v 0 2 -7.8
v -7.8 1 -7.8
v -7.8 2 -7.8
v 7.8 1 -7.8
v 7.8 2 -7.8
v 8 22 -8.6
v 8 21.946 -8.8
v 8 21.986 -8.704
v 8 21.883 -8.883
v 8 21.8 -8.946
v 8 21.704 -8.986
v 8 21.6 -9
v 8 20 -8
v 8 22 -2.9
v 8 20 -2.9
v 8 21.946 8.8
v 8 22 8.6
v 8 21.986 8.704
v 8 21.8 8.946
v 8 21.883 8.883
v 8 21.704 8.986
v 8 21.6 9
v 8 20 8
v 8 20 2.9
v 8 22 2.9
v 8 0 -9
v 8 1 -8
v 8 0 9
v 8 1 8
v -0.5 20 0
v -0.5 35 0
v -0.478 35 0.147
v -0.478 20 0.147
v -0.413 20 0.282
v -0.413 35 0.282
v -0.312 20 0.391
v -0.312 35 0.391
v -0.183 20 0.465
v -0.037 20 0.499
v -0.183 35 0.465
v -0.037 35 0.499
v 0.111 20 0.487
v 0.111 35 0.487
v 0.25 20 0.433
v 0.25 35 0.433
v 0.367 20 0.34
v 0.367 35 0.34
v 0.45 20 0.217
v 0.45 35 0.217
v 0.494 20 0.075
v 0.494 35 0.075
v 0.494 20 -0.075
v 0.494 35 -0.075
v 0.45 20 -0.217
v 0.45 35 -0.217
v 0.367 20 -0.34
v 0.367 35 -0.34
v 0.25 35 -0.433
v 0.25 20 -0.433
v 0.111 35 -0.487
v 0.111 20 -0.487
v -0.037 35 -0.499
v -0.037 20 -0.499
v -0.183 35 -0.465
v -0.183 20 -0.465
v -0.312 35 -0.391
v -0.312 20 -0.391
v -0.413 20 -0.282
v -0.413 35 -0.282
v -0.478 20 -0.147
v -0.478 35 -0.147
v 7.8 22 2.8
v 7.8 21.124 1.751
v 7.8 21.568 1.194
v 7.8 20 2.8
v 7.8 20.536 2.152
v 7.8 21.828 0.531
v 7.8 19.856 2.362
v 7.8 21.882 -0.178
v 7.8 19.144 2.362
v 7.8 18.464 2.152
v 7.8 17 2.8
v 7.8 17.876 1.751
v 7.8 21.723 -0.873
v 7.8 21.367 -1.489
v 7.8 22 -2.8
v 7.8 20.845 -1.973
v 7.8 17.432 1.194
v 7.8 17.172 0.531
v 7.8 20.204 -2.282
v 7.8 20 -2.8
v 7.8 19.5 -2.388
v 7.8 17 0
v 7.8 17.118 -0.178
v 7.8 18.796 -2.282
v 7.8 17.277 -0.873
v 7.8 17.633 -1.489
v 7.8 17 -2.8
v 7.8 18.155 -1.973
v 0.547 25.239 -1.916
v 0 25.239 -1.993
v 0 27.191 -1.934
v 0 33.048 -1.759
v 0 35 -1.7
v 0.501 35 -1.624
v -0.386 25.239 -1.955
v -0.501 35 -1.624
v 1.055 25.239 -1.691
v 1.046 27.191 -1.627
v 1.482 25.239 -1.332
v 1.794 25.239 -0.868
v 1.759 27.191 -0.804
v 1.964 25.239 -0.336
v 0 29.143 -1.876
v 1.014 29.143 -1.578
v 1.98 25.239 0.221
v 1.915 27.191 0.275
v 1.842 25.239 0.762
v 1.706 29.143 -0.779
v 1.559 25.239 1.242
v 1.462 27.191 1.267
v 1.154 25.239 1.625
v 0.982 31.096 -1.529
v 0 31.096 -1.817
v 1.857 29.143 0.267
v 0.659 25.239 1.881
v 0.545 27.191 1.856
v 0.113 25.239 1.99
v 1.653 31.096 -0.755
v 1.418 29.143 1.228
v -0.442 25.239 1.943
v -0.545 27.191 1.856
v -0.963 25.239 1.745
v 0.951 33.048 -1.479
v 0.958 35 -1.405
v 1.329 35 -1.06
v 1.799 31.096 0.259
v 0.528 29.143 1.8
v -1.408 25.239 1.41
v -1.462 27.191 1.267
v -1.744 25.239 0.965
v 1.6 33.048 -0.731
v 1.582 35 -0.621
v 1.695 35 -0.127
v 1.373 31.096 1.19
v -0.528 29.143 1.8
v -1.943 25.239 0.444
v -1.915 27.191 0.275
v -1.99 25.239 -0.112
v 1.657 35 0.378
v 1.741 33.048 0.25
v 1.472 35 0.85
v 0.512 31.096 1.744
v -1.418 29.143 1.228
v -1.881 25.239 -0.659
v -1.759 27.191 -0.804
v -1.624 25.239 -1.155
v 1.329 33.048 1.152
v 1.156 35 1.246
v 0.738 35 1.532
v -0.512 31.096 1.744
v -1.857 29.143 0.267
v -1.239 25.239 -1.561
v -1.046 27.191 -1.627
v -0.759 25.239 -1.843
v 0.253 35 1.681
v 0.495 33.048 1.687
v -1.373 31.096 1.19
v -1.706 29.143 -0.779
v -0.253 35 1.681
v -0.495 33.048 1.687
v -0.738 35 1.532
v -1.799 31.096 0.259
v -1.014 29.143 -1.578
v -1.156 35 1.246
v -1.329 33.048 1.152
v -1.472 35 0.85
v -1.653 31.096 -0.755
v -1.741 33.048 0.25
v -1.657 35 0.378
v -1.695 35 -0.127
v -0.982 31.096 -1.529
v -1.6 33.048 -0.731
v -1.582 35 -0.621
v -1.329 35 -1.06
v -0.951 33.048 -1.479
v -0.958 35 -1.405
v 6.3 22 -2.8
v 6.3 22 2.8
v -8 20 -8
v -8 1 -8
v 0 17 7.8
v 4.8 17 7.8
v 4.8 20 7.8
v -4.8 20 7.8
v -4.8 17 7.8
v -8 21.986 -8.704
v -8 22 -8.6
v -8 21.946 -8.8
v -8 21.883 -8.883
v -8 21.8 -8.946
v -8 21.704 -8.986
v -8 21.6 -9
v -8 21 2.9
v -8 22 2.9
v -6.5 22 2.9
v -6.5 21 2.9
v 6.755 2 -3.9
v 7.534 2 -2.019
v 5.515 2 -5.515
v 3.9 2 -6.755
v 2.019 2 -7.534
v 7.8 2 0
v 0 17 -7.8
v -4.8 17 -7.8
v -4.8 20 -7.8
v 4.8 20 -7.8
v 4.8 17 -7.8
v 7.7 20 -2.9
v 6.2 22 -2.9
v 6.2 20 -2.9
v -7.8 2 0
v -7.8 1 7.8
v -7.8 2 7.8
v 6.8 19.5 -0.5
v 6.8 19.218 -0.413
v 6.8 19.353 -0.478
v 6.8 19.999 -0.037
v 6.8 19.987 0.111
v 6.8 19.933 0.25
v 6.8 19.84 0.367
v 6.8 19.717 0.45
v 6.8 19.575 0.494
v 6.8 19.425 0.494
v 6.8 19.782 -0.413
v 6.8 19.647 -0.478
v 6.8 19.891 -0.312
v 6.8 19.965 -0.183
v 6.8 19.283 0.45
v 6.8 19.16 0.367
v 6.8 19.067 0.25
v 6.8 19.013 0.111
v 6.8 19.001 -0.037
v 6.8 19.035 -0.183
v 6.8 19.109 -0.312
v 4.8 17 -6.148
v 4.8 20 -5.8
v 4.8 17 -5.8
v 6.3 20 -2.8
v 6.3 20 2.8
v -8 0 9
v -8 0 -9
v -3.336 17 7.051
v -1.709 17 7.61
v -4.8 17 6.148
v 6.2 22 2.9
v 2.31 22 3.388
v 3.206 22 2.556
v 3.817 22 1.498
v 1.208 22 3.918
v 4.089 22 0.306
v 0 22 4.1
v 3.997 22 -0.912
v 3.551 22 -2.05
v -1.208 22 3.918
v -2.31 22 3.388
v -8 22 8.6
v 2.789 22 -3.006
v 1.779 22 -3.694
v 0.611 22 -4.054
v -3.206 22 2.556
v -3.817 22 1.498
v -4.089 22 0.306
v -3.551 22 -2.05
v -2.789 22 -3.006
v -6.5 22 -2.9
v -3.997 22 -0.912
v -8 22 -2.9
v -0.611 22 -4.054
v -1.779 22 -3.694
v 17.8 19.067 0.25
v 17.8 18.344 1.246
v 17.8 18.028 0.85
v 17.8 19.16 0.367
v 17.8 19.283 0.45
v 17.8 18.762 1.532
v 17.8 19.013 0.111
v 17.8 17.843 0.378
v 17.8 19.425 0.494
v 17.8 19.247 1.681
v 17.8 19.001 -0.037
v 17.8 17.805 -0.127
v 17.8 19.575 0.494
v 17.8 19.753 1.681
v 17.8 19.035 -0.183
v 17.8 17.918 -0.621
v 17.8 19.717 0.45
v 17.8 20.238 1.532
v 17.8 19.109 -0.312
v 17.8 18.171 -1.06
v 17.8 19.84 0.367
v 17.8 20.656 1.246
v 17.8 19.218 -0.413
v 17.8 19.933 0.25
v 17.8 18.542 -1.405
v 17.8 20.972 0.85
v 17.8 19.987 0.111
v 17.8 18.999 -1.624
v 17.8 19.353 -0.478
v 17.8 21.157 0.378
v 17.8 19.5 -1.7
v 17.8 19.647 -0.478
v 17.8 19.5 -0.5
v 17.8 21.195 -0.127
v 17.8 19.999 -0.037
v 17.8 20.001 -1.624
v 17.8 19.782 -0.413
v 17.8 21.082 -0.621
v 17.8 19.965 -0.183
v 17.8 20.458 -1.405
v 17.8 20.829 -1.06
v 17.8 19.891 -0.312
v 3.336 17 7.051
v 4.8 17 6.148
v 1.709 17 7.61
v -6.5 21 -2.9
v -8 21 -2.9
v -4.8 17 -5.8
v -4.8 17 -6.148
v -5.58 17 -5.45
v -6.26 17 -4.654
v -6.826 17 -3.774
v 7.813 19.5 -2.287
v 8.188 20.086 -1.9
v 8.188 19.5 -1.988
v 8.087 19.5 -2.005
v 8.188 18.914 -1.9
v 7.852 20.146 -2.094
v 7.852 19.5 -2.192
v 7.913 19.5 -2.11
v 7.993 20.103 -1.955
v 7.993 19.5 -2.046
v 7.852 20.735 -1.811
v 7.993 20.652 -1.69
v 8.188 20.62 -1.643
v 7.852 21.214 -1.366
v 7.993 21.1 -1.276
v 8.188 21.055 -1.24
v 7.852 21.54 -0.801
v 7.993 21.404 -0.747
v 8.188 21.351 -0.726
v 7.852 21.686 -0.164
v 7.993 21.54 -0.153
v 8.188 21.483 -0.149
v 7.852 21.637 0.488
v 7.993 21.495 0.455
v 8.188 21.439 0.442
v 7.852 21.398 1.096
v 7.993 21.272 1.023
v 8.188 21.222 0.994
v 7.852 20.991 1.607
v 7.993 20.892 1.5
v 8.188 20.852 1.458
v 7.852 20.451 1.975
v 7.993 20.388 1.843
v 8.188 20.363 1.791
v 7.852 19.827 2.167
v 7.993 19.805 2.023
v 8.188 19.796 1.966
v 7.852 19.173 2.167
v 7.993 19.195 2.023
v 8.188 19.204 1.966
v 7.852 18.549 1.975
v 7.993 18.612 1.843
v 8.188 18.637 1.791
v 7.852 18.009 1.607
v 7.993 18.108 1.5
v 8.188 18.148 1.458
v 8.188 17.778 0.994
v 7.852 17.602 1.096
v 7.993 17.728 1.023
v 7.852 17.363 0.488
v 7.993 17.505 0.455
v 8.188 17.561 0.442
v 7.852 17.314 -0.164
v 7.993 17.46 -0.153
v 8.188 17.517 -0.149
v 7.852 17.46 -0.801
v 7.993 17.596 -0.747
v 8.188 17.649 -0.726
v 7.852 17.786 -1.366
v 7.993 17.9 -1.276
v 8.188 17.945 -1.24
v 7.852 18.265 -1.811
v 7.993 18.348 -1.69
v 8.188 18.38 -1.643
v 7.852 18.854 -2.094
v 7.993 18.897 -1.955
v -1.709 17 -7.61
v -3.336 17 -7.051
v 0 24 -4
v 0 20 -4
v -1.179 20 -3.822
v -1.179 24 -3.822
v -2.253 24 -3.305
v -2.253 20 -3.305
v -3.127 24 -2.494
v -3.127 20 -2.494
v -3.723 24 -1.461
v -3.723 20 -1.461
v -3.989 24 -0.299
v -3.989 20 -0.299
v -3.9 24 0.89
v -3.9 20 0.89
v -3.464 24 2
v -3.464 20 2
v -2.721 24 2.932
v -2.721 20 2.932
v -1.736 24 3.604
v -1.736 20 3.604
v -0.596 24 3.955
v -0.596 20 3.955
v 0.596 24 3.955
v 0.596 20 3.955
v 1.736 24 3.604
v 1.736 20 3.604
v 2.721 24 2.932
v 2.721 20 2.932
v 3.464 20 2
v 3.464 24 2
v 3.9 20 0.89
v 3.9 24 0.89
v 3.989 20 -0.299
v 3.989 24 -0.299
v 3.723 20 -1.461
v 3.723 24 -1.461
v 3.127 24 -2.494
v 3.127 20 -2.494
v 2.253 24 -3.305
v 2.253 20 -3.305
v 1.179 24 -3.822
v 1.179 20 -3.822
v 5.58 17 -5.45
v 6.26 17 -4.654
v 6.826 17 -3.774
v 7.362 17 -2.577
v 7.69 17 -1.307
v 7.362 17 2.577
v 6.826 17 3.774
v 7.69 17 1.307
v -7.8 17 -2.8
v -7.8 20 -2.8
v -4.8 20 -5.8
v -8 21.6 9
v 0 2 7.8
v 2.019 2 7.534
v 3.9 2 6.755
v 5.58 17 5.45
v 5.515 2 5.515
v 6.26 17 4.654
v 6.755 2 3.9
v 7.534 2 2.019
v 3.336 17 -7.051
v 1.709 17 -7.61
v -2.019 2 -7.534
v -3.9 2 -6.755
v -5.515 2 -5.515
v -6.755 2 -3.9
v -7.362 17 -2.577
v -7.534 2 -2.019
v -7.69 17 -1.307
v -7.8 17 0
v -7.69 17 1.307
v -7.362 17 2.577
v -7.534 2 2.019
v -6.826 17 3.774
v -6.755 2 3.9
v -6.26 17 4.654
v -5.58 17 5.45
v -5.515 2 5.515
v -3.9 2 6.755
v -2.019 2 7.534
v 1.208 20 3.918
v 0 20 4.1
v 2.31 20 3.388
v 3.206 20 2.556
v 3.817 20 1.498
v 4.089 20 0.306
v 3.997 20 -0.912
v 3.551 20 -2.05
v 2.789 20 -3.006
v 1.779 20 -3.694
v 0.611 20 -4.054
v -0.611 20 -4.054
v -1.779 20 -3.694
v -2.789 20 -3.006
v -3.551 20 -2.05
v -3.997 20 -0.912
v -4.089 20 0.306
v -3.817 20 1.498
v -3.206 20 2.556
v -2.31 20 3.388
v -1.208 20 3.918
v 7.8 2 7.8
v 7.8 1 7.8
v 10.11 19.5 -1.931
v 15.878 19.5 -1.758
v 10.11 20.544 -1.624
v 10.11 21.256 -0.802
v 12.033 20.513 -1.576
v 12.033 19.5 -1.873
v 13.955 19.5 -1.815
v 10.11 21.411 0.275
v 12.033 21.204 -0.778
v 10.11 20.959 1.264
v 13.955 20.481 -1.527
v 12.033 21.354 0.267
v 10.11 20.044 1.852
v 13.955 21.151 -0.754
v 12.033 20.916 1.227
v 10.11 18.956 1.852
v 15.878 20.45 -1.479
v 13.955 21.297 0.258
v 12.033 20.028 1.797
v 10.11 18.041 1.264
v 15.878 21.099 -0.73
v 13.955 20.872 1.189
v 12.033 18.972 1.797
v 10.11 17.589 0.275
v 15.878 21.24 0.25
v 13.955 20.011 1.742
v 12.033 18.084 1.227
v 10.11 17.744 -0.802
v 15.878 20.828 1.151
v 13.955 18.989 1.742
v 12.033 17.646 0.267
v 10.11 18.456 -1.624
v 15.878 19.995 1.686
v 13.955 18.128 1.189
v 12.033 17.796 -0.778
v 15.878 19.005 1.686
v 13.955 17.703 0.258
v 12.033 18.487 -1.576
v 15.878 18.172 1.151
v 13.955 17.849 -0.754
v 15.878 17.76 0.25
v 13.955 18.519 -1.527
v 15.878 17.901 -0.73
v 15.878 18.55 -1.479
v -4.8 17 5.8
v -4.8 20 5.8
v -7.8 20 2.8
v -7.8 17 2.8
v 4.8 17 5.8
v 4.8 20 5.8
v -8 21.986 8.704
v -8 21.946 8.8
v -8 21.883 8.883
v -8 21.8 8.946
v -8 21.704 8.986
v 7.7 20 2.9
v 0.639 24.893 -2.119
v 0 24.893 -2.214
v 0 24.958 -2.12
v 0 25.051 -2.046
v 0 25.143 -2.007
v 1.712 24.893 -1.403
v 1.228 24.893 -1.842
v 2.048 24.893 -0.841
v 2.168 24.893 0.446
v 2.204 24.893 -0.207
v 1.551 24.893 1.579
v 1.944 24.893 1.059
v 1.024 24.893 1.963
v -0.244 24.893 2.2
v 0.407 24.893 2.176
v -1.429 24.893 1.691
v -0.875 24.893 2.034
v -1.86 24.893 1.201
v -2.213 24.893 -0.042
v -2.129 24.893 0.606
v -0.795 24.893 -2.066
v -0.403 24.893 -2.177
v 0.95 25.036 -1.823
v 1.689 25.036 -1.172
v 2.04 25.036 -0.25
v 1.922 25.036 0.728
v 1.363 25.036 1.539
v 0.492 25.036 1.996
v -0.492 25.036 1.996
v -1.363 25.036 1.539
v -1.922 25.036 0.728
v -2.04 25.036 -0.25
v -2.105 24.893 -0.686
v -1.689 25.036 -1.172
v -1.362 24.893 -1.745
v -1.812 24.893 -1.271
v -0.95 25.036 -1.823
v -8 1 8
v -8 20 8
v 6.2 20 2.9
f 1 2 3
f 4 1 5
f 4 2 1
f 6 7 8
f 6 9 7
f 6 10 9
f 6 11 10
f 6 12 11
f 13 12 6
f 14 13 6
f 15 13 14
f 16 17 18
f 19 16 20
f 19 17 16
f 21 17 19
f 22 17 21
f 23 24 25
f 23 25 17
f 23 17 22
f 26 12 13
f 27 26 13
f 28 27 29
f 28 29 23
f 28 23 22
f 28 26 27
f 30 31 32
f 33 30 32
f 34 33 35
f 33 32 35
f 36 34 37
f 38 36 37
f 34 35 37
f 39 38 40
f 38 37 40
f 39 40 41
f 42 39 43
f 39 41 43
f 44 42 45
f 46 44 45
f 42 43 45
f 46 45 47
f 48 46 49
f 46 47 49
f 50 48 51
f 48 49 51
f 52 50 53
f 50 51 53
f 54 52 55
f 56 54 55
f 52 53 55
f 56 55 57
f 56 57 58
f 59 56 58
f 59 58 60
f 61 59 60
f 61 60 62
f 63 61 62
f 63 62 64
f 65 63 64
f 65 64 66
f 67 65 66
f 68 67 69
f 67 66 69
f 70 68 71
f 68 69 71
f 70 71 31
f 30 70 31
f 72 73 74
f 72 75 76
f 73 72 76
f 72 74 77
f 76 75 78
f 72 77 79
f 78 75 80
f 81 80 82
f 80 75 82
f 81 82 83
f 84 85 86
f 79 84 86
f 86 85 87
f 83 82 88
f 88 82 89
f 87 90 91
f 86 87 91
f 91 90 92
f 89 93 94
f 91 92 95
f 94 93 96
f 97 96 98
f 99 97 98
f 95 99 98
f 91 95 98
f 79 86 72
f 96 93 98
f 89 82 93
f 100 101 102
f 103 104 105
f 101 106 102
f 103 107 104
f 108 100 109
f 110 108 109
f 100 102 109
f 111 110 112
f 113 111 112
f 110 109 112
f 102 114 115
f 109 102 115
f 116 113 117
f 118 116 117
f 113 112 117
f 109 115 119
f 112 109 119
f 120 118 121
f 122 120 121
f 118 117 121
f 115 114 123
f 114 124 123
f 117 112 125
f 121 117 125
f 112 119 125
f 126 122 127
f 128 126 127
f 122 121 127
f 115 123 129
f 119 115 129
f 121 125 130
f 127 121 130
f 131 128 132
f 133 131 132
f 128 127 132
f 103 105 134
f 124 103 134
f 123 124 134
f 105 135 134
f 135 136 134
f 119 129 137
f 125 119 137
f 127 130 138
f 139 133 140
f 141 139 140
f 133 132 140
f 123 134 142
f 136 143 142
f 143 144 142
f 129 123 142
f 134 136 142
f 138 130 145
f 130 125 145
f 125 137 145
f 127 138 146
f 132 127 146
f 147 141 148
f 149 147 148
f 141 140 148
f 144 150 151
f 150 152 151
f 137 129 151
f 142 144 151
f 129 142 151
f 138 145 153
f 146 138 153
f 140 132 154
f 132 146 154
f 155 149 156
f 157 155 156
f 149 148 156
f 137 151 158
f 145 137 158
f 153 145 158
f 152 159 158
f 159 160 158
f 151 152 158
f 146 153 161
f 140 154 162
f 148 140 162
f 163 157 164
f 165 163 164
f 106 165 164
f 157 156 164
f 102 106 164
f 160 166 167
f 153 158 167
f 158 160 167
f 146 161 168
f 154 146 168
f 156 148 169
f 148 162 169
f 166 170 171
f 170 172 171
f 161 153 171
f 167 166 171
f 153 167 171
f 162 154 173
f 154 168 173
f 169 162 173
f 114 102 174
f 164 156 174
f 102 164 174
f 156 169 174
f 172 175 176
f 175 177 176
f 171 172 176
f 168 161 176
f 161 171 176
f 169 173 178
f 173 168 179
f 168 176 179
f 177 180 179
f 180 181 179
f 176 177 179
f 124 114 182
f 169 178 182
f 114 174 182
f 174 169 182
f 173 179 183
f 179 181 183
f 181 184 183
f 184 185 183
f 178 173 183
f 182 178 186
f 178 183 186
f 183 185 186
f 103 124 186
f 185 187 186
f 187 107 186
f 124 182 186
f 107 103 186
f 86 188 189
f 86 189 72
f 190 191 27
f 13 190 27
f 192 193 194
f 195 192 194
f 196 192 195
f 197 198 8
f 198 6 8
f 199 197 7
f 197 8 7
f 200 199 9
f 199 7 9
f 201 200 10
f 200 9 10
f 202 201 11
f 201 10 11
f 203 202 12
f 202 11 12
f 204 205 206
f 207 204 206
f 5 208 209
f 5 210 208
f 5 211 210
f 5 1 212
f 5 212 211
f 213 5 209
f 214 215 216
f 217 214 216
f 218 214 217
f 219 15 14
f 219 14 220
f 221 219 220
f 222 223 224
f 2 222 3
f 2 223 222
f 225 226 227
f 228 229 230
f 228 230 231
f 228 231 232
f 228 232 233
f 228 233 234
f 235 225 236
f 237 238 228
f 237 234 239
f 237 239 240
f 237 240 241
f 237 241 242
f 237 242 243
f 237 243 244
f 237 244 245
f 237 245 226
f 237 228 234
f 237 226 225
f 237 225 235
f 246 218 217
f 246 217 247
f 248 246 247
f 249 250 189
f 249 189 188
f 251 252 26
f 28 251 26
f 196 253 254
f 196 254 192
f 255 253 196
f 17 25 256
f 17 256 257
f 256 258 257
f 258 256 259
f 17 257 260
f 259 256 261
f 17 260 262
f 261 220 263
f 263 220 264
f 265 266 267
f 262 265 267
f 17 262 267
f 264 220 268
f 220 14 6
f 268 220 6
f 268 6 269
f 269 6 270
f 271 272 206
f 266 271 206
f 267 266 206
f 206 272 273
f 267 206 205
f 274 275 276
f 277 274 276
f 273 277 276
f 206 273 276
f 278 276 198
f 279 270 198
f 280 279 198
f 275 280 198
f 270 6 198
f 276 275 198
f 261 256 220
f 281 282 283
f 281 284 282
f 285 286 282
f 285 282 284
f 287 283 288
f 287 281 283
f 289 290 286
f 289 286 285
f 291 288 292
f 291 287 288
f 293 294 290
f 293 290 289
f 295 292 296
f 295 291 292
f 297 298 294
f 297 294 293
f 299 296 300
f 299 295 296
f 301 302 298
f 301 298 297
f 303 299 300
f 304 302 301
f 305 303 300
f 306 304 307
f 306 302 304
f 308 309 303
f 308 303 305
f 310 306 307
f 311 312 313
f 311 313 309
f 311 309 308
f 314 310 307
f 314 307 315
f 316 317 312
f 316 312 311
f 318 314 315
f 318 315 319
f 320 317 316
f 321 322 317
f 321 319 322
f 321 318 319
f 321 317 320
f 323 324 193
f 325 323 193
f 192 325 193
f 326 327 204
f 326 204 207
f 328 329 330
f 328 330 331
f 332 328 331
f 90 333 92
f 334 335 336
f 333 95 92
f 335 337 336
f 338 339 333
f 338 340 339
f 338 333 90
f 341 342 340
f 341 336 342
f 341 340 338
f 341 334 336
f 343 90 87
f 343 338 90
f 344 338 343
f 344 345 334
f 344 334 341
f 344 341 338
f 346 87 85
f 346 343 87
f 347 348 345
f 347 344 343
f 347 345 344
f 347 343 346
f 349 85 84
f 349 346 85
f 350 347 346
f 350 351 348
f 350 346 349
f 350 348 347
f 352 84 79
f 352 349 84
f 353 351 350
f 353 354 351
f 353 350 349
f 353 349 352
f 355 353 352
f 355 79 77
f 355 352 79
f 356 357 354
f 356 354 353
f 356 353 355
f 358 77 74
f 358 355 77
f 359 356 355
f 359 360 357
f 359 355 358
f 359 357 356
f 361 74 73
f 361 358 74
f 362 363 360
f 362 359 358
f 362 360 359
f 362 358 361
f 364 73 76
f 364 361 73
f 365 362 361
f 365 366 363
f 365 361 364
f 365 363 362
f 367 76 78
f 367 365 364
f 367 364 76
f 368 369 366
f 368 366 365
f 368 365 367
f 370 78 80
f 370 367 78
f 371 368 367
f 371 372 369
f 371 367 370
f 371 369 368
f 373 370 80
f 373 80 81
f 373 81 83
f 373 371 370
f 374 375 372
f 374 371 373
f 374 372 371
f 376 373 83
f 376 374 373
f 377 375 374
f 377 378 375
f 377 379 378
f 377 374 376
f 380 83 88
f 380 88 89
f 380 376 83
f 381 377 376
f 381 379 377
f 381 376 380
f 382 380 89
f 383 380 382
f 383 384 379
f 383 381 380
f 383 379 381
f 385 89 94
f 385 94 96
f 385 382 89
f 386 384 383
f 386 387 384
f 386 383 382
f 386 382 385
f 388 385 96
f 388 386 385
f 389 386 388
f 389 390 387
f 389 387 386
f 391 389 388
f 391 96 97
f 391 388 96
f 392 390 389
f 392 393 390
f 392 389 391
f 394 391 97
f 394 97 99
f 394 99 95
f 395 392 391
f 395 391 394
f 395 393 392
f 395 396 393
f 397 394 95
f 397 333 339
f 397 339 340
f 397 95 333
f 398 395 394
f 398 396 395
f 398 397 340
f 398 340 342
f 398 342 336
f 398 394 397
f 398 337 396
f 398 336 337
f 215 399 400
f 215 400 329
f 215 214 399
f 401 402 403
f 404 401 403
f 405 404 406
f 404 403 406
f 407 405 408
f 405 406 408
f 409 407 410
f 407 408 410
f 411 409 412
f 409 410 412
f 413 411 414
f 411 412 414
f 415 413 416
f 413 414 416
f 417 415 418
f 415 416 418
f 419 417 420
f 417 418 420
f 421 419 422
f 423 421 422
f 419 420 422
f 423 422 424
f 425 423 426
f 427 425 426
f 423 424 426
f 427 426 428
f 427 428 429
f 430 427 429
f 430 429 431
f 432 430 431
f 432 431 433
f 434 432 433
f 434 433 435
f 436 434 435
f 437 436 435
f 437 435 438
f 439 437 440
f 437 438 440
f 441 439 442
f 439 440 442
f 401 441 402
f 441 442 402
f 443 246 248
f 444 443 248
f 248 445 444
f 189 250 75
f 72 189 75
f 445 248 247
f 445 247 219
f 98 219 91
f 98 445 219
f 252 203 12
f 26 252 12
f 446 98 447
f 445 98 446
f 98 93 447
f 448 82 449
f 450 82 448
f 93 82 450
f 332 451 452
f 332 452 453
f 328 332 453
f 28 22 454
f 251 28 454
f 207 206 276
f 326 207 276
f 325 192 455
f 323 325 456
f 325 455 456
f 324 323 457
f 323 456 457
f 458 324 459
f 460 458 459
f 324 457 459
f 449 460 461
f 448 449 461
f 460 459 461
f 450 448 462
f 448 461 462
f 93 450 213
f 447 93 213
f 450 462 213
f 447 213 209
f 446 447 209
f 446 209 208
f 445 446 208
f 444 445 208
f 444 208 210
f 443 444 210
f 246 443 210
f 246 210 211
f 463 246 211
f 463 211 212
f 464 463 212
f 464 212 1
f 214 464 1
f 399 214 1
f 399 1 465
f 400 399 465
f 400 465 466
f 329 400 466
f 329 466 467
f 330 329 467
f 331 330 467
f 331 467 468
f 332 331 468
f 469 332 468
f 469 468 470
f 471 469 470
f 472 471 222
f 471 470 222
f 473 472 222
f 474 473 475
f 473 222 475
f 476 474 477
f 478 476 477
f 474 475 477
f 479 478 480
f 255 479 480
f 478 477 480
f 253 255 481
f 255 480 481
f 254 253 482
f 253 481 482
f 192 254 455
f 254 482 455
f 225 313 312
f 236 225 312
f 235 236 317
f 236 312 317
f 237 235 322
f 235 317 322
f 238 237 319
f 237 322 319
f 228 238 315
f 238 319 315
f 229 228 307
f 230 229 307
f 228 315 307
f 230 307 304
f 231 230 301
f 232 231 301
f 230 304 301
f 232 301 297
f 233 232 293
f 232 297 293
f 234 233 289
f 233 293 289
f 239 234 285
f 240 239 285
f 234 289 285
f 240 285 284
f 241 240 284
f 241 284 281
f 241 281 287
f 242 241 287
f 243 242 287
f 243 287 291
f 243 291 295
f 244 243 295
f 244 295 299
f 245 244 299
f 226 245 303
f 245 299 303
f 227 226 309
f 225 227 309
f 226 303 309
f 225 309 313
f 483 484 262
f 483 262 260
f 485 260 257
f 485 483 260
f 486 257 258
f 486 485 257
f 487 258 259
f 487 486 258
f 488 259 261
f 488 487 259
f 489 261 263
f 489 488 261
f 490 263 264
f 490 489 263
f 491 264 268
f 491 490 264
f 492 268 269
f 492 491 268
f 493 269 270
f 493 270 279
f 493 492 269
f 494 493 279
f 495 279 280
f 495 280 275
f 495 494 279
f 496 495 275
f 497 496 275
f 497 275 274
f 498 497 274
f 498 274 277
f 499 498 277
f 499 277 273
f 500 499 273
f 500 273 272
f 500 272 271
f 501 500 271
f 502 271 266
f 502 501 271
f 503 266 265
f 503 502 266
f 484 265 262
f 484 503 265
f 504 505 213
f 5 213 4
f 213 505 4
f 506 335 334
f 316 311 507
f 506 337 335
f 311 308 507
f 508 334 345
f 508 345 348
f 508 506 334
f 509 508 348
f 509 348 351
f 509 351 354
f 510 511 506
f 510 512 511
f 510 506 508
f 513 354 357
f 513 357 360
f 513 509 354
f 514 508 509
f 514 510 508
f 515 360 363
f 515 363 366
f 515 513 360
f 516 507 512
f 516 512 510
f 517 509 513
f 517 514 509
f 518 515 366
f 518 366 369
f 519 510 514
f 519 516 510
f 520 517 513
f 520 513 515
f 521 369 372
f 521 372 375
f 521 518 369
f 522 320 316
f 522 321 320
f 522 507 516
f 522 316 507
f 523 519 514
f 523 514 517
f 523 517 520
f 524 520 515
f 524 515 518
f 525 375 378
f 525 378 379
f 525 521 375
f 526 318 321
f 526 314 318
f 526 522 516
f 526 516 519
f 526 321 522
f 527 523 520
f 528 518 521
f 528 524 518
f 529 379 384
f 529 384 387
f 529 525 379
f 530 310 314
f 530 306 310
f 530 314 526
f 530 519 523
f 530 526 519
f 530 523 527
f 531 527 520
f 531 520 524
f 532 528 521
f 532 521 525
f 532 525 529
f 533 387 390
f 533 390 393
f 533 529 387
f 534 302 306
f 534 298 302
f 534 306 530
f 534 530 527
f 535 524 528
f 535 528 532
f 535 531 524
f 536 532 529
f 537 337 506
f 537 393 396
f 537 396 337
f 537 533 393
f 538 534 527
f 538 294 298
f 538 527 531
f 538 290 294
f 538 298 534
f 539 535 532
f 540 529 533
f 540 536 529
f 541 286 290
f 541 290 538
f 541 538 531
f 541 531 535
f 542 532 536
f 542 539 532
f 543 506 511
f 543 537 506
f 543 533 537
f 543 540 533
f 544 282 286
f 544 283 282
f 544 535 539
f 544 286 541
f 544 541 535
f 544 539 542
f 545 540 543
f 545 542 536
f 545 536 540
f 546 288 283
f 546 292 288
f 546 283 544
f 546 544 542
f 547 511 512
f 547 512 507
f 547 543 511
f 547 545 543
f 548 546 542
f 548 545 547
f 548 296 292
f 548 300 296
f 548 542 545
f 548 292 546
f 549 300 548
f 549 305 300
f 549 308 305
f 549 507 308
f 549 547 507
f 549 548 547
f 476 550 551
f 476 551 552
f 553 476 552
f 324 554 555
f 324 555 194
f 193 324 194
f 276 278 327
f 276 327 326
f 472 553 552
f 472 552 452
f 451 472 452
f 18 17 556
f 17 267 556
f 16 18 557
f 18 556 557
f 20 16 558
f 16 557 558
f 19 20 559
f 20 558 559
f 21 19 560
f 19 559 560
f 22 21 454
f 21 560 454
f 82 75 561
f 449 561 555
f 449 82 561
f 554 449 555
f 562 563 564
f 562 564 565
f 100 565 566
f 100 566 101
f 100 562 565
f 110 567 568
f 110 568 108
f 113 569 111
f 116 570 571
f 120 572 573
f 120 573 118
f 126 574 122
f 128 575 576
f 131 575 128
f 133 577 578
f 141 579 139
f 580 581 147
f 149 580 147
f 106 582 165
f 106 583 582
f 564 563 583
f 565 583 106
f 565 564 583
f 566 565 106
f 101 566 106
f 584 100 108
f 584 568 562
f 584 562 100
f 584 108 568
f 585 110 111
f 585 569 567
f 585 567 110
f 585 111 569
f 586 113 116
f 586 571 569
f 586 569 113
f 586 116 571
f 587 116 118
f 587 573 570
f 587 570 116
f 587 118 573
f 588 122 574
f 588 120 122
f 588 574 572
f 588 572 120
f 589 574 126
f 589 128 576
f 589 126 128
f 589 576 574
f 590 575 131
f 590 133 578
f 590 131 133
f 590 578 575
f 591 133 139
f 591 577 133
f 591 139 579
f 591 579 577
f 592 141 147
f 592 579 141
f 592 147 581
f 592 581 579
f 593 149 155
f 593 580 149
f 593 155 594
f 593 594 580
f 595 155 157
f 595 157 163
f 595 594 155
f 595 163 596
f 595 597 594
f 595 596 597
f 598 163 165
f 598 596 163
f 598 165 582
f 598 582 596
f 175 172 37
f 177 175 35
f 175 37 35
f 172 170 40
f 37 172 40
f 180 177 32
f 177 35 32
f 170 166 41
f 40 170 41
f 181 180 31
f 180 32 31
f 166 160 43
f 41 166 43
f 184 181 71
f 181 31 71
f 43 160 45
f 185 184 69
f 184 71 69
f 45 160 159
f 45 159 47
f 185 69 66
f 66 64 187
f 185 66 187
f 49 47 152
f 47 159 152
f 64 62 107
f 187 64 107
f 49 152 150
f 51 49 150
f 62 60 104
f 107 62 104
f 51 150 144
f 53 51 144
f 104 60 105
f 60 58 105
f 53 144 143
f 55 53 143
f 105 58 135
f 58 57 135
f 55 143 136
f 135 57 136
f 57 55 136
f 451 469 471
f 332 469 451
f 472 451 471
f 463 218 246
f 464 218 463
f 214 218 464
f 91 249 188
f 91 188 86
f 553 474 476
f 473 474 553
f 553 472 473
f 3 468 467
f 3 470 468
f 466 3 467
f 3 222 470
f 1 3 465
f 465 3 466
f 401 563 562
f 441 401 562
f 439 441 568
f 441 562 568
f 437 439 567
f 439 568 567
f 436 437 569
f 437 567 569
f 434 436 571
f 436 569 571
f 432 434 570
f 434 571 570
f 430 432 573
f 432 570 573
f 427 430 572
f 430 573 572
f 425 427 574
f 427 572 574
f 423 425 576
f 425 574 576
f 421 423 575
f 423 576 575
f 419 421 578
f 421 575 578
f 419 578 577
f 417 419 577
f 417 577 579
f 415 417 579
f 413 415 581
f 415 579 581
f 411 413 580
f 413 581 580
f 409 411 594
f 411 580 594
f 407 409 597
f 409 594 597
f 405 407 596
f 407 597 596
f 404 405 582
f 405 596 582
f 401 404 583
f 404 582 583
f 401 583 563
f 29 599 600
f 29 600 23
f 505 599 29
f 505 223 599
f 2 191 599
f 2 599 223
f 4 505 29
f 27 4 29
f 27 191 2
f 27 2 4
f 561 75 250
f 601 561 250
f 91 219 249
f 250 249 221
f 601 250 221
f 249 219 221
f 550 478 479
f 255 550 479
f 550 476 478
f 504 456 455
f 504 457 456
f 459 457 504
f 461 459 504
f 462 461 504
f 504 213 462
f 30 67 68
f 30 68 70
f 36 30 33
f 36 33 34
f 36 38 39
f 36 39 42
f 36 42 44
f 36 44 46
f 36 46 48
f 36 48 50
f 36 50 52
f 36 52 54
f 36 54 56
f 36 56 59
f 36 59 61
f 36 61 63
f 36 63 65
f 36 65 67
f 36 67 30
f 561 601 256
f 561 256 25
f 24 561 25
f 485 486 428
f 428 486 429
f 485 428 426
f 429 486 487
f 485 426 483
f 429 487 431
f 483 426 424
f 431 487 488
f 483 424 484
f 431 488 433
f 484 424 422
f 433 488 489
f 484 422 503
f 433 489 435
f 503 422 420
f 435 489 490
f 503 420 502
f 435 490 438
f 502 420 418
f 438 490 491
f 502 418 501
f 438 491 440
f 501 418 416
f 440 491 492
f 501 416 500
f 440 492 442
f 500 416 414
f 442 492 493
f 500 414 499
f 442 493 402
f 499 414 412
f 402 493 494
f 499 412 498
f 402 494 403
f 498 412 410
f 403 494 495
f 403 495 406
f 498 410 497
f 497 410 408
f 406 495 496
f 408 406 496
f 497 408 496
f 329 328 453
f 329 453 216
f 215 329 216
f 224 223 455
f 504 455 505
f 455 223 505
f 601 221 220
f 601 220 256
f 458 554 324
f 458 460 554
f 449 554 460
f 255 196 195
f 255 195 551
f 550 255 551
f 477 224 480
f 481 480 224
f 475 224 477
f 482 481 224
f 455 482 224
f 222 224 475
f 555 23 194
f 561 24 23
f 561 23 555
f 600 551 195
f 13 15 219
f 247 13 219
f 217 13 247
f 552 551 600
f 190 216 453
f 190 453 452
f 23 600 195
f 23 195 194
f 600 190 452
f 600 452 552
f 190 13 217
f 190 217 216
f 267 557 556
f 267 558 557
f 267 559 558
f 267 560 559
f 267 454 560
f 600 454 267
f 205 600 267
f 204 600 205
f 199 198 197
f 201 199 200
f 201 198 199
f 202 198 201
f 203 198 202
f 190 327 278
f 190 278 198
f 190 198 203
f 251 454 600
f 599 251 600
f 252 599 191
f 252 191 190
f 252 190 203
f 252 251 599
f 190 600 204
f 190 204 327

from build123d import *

# Parameters (mm, degrees)
SKETCH_1_W          = 16
SKETCH_1_H          = 18
EXTRUDE_1_DEPTH     = 1
SKETCH_2_W          = 15.6
SKETCH_2_H          = 15.6
EXTRUDE_2_DEPTH     = 1
SKETCH_3_R          = 7.8
EXTRUDE_3_DEPTH     = 15
EXTRUDE_4_DEPTH     = 3
SKETCH_5_R          = 4
EXTRUDE_5_DEPTH     = 4
SKETCH_7_R          = 0.5
CUT_EXTRUDE_1_DEPTH = 15
SKETCH_8_W          = 1.5
SKETCH_8_H          = 5.6
EXTRUDE_6_DEPTH     = 2
SKETCH_9_R          = 2
SKETCH_10_R         = 1.7
SKETCH_11_R         = 0.5
CUT_EXTRUDE_2_DEPTH = 11
SKETCH_12_W         = 16
SKETCH_12_H         = 1
EXTRUDE_7_DEPTH     = 19
SKETCH_13_R         = 4.1
EXTRUDE_8_DEPTH     = 2
SKETCH_14_W         = 1.5
SKETCH_14_H         = 5.8
CUT_EXTRUDE_3_DEPTH = 1
FILLET_1_R          = 0.4
FILLET_2_R          = 0.4


with BuildPart() as part:
    # 草图1 → 凸台-拉伸1 (new body)
    with BuildSketch(Plane(origin=(0, 0, 0), x_dir=(1, 0, 0), z_dir=(0, 1, 0))):
        Rectangle(SKETCH_1_W, SKETCH_1_H)
    extrude(amount=EXTRUDE_1_DEPTH)

    # 草图2 → 凸台-拉伸2 (add)
    with BuildSketch(Plane(origin=(0, 1, 0), x_dir=(1, 0, 0), z_dir=(0, 1, 0))):
        Rectangle(SKETCH_2_W, SKETCH_2_H)
    extrude(amount=EXTRUDE_2_DEPTH)

    # 草图3 → 凸台-拉伸3 (add)
    with BuildSketch(Plane(origin=(0, 2, 0), x_dir=(1, 0, 0), z_dir=(0, 1, 0))):
        with Locations(Location((0, 0, 0), (0, 0, 270))):
            Circle(SKETCH_3_R)
    extrude(amount=EXTRUDE_3_DEPTH)

    # 草图4 → 凸台-拉伸4 (add)
    with BuildSketch(Plane(origin=(0, 17, 0), x_dir=(1, 0, 0), z_dir=(0, 1, 0))):
        Polygon((-4.8, 7.8), (4.8, 7.8), (4.8, 5.8), (7.8, 2.8), (7.8, -2.8), (4.8, -5.8), (4.8, -7.8), (-4.8, -7.8), (-4.8, -5.8), (-7.8, -2.8), (-7.8, 2.8), (-4.8, 5.8), align=None)
    extrude(amount=EXTRUDE_4_DEPTH)

    # 草图5 → 凸台-拉伸5 (add)
    with BuildSketch(Plane(origin=(0, 20, 0), x_dir=(1, 0, 0), z_dir=(0, 1, 0))):
        with Locations(Location((0, 0, 0), (0, 0, 90))):
            Circle(SKETCH_5_R)
    extrude(amount=EXTRUDE_5_DEPTH)

    # 草图6 → 旋转1 (revolve)
    with BuildSketch(Plane.XY, mode=Mode.PRIVATE) as revolve_1_sk:
        Polygon((0, 24), (4, 24), (2, 25), (1.7, 35), (0, 35), align=None)
    revolve(revolve_1_sk.sketch.rotate(Axis((0, 35, 0), (0, -1, 0)), 270), axis=Axis((0, 35, 0), (0, -1, 0)))

    # 草图7 → 切除-拉伸1 (cut)
    with BuildSketch(Plane(origin=(0, 35, 0), x_dir=(1, 0, 0), z_dir=(0, 1, 0))):
        with Locations(Location((0, 0, 0), (0, 0, 180))):
            Circle(SKETCH_7_R)
    extrude(amount=-CUT_EXTRUDE_1_DEPTH, mode=Mode.SUBTRACT)

    # 草图8 → 凸台-拉伸6 (add)
    with BuildSketch(Plane(origin=(0, 20, 0), x_dir=(1, 0, 0), z_dir=(0, 1, 0))):
        with Locations((7.05, 0)):
            Rectangle(SKETCH_8_W, SKETCH_8_H)
    extrude(amount=EXTRUDE_6_DEPTH)

    # 草图9 → 放样1 section 0
    with BuildSketch(Plane(origin=(7.8, 0, 0), x_dir=(0, 0, -1), z_dir=(1, 0, 0))):
        with Locations((0, 19.5)):
            Circle(SKETCH_9_R)
    # 草图10 → 放样1 section 1
    with BuildSketch(Plane(origin=(17.8, 0, 0), x_dir=(0, 0, -1), z_dir=(1, 0, 0))):
        with Locations((0, 19.5)):
            Circle(SKETCH_10_R)
    loft()

    # 草图11 → 切除-拉伸2 (cut)
    with BuildSketch(Plane(origin=(17.8, 0, 0), x_dir=(0, 0, -1), z_dir=(1, 0, 0))):
        with Locations((0, 19.5)):
            Circle(SKETCH_11_R)
    extrude(amount=-CUT_EXTRUDE_2_DEPTH, mode=Mode.SUBTRACT)

    # 草图12 → 凸台-拉伸7 (add)
    with BuildSketch(Plane(origin=(0, 1, 0), x_dir=(1, 0, 0), z_dir=(0, 1, 0))):
        with Locations((0, 8.5)):
            Rectangle(SKETCH_12_W, SKETCH_12_H)
        with Locations((0, -8.5)):
            Rectangle(SKETCH_12_W, SKETCH_12_H)
    extrude(amount=EXTRUDE_7_DEPTH)

    # 草图13 → 凸台-拉伸8 (add)
    with BuildSketch(Plane(origin=(0, 20, 0), x_dir=(1, 0, 0), z_dir=(0, 1, 0))):
        Polygon((8, 2.9), (6.2, 2.9), (6.2, -2.9), (8, -2.9), (8, -9), (-8, -9), (-8, 9), (8, 9), align=None)
        with Locations(Location((0, 0, 0), (0, 0, 270))):
            Circle(SKETCH_13_R, mode=Mode.SUBTRACT)
    extrude(amount=EXTRUDE_8_DEPTH)

    # 草图14 → 切除-拉伸3 (cut)
    with BuildSketch(Plane(origin=(0, 22, 0), x_dir=(1, 0, 0), z_dir=(0, 1, 0))):
        with Locations((-7.25, 0)):
            Rectangle(SKETCH_14_W, SKETCH_14_H)
    extrude(amount=-CUT_EXTRUDE_3_DEPTH, mode=Mode.SUBTRACT)

    # 圆角1
    fillet_1_edges = [part.edges().sort_by_distance(p)[0] for p in [
        (7.8, 19.5, 2),
        (0, 25, 2),
    ]]
    fillet(fillet_1_edges, radius=FILLET_1_R)

    # 圆角2
    fillet_2_edges = [part.edges().sort_by_distance(p)[0] for p in [
        (0, 22, 9),
        (0, 22, -9),
    ]]
    fillet(fillet_2_edges, radius=FILLET_2_R)


solid = part.part
